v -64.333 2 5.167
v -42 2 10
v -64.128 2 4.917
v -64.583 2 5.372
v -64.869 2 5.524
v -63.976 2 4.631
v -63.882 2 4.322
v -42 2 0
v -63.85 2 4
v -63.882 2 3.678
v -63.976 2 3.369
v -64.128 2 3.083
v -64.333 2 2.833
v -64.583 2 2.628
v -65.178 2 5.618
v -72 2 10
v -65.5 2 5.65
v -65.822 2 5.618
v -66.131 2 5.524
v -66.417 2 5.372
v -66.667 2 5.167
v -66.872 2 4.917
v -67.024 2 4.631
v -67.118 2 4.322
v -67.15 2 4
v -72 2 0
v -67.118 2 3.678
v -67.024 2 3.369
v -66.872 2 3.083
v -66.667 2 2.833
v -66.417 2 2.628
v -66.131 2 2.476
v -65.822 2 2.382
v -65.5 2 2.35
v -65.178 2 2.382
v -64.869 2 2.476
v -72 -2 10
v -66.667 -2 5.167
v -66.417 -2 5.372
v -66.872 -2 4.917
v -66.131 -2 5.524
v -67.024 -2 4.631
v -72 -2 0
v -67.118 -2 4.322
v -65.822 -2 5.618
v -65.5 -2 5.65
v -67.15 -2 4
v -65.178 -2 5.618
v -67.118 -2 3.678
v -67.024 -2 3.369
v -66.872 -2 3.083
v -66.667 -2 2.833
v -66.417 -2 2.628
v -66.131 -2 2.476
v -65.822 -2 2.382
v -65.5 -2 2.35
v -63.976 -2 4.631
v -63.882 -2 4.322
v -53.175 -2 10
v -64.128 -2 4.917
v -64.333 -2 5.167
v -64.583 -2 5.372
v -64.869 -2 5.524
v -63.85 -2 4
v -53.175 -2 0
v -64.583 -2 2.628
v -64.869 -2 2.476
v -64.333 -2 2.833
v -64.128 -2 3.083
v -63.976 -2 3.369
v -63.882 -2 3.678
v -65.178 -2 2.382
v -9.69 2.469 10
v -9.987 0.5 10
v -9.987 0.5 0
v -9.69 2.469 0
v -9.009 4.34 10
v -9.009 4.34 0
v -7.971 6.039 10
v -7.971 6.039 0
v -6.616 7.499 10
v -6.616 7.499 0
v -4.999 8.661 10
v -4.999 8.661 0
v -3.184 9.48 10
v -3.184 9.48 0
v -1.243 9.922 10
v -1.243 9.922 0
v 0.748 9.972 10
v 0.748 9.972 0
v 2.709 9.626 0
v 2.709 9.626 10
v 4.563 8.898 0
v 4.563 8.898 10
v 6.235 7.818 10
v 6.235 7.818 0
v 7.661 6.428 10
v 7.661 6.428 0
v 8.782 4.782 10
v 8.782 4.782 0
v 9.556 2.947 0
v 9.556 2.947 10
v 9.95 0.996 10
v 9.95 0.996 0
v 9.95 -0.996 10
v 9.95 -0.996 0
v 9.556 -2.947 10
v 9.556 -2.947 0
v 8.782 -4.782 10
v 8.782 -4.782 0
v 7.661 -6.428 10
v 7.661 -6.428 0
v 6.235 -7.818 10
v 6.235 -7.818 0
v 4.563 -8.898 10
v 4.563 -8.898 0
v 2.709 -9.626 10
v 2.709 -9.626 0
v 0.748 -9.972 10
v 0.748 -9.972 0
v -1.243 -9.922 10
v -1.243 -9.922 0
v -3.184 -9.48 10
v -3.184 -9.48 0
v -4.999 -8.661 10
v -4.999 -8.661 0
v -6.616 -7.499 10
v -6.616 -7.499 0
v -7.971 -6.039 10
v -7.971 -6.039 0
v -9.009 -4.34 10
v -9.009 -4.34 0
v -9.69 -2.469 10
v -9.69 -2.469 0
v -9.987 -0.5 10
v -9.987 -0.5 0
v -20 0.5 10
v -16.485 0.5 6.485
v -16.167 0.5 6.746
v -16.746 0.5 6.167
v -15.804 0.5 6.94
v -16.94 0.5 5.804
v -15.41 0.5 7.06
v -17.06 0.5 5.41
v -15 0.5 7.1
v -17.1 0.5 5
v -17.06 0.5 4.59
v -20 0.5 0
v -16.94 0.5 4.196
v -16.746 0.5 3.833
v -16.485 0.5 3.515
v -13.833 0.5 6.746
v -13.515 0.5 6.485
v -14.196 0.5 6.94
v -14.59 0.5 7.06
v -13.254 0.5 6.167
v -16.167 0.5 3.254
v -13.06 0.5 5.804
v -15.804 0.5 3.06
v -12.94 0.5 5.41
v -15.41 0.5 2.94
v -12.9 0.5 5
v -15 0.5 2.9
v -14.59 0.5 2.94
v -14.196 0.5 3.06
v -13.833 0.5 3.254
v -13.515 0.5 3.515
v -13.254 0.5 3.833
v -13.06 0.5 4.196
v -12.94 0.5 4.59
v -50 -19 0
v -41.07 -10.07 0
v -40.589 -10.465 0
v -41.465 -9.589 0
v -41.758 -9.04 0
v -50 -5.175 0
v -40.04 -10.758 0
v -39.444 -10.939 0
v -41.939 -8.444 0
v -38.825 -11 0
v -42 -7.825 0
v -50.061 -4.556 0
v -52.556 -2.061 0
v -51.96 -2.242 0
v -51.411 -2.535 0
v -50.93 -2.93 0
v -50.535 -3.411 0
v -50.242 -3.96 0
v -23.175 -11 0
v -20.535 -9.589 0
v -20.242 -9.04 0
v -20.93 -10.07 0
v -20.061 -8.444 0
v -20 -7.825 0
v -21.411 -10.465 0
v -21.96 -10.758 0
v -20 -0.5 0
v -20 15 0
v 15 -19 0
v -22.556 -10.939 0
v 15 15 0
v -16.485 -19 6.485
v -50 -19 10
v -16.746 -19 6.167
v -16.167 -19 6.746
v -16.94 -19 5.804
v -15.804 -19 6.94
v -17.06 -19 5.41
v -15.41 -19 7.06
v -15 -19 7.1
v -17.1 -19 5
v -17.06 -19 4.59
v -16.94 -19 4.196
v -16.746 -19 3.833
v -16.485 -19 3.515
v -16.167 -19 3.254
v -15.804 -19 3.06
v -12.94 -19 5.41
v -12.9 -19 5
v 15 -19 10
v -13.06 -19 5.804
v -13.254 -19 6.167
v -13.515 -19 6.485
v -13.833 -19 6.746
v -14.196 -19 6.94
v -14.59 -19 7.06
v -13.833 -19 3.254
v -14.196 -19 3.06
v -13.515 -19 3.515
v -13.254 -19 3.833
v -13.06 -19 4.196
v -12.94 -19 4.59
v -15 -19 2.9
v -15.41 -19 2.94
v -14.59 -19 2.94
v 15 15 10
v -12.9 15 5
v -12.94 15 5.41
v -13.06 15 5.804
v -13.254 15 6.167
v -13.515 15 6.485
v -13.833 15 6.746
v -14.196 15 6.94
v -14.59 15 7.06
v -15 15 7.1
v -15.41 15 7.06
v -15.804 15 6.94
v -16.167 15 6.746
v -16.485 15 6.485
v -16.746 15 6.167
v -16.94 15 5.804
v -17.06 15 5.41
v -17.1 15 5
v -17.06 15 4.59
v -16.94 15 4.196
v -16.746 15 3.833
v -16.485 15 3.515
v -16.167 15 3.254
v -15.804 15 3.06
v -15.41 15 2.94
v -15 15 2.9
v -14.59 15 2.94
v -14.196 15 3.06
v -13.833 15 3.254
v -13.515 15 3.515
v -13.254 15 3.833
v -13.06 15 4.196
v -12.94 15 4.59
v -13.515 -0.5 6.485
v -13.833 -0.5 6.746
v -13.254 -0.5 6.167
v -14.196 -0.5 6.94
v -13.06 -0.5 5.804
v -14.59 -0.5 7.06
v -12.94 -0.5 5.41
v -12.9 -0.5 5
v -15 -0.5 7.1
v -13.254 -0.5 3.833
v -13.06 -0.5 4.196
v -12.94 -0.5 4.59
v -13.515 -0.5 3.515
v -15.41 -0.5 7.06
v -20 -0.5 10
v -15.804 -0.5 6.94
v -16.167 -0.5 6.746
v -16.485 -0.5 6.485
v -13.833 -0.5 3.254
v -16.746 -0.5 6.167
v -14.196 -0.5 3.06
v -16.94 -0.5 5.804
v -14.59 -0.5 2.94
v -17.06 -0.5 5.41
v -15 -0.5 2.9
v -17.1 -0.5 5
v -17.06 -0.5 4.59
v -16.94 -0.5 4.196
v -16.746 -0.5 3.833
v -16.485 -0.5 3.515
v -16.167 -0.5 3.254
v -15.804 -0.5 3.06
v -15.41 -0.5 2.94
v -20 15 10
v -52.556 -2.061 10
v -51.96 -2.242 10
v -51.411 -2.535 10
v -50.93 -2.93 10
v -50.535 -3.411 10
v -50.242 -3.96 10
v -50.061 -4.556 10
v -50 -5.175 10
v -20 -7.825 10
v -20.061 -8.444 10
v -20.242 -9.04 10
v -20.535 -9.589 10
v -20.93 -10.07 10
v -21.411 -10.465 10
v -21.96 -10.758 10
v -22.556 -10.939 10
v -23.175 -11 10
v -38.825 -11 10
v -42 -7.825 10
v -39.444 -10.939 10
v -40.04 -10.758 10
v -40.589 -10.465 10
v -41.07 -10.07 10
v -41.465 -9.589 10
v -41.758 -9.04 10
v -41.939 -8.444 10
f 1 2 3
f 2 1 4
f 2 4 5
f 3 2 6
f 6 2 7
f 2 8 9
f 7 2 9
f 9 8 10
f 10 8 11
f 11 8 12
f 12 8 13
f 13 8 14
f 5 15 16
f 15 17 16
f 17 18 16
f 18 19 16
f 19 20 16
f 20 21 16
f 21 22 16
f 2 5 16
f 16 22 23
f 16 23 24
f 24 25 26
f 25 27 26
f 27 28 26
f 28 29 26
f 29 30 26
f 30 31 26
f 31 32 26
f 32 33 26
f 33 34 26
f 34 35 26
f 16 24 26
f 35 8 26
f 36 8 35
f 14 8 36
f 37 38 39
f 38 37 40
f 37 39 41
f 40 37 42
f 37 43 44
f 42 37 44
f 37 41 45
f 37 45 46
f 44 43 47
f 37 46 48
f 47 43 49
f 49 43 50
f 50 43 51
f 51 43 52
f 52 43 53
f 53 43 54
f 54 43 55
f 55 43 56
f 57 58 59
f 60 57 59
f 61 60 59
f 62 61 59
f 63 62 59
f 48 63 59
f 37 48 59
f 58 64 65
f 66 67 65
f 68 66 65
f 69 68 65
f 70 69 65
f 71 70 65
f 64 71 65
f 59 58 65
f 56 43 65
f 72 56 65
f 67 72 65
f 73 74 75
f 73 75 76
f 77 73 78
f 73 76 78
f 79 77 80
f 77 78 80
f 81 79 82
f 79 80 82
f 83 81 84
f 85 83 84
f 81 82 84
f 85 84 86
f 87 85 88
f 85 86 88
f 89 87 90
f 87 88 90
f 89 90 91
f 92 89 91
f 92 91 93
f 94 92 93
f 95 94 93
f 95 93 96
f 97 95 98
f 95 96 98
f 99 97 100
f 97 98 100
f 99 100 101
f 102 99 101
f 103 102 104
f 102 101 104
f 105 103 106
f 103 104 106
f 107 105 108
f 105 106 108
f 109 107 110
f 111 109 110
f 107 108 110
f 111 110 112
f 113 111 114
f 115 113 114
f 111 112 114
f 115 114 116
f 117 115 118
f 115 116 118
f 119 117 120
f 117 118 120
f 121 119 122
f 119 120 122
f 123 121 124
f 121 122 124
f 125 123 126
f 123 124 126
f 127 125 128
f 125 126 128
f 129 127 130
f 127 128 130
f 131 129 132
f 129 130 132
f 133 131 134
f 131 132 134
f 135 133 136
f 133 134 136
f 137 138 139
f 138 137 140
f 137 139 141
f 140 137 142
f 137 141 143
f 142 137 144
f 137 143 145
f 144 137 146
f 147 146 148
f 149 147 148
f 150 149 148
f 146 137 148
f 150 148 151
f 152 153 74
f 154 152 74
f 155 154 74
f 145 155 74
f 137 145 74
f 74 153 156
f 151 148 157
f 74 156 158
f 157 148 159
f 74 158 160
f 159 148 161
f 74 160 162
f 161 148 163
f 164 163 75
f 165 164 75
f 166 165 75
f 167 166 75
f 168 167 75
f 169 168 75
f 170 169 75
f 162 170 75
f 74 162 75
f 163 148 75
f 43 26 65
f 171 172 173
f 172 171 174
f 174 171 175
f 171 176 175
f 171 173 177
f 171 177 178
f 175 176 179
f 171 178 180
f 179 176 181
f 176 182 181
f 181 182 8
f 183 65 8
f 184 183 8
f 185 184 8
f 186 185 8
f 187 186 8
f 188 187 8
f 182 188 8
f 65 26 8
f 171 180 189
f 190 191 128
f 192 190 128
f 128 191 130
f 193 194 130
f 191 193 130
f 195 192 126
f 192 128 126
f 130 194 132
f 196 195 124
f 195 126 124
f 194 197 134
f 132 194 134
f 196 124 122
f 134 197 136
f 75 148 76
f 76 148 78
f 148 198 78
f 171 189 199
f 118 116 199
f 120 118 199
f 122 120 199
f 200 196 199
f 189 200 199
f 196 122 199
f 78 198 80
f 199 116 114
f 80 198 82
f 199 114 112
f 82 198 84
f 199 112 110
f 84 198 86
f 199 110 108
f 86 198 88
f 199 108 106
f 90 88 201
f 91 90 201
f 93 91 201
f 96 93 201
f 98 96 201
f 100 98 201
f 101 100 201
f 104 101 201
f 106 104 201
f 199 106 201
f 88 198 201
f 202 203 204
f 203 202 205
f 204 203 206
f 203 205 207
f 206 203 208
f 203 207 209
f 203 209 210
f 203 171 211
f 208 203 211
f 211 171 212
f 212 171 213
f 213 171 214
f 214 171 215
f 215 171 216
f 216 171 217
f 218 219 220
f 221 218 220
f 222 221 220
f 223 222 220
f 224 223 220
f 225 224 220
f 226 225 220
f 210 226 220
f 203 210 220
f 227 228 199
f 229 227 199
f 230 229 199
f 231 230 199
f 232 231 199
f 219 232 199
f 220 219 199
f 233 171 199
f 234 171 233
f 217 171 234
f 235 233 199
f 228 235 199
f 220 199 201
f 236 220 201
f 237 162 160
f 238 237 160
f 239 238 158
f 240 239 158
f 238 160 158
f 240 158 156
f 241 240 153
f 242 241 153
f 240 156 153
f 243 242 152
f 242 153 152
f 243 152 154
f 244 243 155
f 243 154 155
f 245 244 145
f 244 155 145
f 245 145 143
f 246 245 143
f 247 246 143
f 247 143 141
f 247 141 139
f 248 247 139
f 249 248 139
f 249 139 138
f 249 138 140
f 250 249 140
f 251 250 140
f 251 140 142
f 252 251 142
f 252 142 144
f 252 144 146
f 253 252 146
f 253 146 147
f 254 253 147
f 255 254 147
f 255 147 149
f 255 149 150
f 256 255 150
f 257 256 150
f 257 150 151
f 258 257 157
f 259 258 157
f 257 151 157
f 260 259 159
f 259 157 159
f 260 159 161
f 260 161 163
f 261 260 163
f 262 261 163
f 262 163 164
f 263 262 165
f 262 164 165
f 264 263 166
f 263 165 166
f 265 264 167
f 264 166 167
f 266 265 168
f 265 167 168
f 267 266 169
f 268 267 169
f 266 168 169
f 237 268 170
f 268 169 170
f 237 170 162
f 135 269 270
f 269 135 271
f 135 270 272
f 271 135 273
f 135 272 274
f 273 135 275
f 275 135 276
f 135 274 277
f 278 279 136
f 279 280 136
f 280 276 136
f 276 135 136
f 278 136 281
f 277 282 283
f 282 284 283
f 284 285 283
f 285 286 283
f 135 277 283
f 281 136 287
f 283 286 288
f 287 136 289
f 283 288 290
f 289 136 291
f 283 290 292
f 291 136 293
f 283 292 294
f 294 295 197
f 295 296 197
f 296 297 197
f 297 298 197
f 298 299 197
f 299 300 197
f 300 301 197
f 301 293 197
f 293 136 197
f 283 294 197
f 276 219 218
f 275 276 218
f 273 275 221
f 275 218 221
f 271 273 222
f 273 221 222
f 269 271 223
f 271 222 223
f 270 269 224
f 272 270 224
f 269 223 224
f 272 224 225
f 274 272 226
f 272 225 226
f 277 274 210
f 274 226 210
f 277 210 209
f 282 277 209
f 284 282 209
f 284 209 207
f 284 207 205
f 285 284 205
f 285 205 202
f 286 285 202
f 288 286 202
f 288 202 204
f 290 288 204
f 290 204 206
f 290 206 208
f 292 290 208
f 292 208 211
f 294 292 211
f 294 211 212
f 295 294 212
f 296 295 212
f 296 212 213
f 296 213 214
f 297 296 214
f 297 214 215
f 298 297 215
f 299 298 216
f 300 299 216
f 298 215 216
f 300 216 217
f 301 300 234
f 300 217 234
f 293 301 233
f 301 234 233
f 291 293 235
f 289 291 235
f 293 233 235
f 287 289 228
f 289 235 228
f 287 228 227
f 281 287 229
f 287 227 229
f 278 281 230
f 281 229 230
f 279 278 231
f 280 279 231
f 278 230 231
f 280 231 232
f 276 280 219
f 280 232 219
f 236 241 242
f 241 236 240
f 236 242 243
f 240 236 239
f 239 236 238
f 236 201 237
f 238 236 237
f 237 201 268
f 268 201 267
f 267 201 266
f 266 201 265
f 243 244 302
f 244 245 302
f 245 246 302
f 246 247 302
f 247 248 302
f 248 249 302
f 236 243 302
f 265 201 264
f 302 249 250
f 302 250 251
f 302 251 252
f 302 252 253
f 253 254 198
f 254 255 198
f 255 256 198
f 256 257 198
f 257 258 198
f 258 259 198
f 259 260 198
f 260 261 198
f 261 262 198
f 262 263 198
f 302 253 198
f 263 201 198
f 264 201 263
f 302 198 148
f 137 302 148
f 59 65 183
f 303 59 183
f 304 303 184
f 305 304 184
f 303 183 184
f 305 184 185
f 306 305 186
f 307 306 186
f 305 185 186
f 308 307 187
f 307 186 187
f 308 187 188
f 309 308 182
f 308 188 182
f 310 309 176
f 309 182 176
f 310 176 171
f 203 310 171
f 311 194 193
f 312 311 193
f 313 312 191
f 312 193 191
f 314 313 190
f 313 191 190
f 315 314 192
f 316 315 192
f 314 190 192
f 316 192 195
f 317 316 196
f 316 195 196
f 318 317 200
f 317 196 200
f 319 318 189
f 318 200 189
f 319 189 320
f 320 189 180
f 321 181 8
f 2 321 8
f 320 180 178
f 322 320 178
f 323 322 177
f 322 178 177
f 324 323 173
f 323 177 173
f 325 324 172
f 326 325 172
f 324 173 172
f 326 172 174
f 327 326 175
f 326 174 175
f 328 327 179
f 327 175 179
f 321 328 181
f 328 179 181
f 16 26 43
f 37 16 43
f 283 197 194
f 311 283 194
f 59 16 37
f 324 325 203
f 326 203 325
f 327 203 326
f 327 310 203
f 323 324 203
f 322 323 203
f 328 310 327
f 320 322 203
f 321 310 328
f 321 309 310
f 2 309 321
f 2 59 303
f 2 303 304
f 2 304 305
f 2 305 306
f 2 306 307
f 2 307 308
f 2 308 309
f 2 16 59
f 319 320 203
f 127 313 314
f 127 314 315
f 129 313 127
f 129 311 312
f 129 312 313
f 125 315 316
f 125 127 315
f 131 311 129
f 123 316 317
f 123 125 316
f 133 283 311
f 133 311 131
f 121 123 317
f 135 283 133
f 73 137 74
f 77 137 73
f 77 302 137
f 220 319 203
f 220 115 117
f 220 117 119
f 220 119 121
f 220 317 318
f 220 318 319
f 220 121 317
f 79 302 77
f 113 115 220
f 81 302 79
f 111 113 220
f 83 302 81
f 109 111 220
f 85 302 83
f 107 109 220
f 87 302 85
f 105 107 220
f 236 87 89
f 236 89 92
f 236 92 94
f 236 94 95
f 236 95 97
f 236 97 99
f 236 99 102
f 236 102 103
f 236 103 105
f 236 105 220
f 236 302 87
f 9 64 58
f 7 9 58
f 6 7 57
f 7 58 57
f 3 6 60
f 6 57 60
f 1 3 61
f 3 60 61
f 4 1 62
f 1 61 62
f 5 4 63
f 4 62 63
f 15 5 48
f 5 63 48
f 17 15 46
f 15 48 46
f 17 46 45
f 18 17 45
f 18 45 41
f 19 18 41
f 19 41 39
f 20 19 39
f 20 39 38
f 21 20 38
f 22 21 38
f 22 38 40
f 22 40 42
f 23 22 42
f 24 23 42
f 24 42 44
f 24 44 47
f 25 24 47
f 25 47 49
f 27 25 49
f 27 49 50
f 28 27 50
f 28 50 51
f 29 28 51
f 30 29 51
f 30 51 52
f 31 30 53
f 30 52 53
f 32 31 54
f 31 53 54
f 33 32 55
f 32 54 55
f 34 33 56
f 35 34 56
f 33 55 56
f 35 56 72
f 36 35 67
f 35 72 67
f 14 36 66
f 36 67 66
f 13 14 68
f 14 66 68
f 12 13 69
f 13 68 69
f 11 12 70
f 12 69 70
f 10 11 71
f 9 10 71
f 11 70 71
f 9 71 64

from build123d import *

# Parameters (mm, degrees)
F1_DEPTH = 10
F3_D     = 4.2
F5_D     = 3.3


with BuildPart() as f1:
    # F0 (on Top) → F1 (new body)
    with BuildSketch(Plane.XY):
        with BuildLine():
            ThreePointArc((-9.9874921777, 0.5), (10, 0), (-9.9874921777, -0.5))
            Line((-9.9874921777, -0.5), (-20, -0.5))
            Line((-20, -0.5), (-20, -7.825))
            ThreePointArc((-20, -7.825), (-20.9299359697, -10.0700640303), (-23.175, -11))
            Line((-23.175, -11), (-38.825, -11))
            ThreePointArc((-38.825, -11), (-41.0700640303, -10.0700640303), (-42, -7.825))
            Line((-42, -7.825), (-42, 2))
            Line((-42, 2), (-72, 2))
            Line((-72, 2), (-72, -2))
            Line((-72, -2), (-53.175, -2))
            ThreePointArc((-53.175, -2), (-50.9299359697, -2.9299359697), (-50, -5.175))
            Line((-50, -5.175), (-50, -19))
            Line((-50, -19), (15, -19))
            Line((15, -19), (15, 15))
            Line((15, 15), (-20, 15))
            Line((-20, 15), (-20, 0.5))
            Line((-20, 0.5), (-9.9874921777, 0.5))
        make_face()
    extrude(amount=F1_DEPTH)

    # F3 (through all)
    with Locations(Plane(origin=(0, 15, 0), x_dir=(-1, 0, 0), z_dir=(0, 1, 0))):
        with Locations((15, 5)):
            Hole(F3_D / 2)

    # F5 (through all)
    with Locations(Plane(origin=(0, 2, 0), x_dir=(-1, 0, 0), z_dir=(0, 1, 0))):
        with Locations((65.5, 4)):
            Hole(F5_D / 2)


solid = f1.part
